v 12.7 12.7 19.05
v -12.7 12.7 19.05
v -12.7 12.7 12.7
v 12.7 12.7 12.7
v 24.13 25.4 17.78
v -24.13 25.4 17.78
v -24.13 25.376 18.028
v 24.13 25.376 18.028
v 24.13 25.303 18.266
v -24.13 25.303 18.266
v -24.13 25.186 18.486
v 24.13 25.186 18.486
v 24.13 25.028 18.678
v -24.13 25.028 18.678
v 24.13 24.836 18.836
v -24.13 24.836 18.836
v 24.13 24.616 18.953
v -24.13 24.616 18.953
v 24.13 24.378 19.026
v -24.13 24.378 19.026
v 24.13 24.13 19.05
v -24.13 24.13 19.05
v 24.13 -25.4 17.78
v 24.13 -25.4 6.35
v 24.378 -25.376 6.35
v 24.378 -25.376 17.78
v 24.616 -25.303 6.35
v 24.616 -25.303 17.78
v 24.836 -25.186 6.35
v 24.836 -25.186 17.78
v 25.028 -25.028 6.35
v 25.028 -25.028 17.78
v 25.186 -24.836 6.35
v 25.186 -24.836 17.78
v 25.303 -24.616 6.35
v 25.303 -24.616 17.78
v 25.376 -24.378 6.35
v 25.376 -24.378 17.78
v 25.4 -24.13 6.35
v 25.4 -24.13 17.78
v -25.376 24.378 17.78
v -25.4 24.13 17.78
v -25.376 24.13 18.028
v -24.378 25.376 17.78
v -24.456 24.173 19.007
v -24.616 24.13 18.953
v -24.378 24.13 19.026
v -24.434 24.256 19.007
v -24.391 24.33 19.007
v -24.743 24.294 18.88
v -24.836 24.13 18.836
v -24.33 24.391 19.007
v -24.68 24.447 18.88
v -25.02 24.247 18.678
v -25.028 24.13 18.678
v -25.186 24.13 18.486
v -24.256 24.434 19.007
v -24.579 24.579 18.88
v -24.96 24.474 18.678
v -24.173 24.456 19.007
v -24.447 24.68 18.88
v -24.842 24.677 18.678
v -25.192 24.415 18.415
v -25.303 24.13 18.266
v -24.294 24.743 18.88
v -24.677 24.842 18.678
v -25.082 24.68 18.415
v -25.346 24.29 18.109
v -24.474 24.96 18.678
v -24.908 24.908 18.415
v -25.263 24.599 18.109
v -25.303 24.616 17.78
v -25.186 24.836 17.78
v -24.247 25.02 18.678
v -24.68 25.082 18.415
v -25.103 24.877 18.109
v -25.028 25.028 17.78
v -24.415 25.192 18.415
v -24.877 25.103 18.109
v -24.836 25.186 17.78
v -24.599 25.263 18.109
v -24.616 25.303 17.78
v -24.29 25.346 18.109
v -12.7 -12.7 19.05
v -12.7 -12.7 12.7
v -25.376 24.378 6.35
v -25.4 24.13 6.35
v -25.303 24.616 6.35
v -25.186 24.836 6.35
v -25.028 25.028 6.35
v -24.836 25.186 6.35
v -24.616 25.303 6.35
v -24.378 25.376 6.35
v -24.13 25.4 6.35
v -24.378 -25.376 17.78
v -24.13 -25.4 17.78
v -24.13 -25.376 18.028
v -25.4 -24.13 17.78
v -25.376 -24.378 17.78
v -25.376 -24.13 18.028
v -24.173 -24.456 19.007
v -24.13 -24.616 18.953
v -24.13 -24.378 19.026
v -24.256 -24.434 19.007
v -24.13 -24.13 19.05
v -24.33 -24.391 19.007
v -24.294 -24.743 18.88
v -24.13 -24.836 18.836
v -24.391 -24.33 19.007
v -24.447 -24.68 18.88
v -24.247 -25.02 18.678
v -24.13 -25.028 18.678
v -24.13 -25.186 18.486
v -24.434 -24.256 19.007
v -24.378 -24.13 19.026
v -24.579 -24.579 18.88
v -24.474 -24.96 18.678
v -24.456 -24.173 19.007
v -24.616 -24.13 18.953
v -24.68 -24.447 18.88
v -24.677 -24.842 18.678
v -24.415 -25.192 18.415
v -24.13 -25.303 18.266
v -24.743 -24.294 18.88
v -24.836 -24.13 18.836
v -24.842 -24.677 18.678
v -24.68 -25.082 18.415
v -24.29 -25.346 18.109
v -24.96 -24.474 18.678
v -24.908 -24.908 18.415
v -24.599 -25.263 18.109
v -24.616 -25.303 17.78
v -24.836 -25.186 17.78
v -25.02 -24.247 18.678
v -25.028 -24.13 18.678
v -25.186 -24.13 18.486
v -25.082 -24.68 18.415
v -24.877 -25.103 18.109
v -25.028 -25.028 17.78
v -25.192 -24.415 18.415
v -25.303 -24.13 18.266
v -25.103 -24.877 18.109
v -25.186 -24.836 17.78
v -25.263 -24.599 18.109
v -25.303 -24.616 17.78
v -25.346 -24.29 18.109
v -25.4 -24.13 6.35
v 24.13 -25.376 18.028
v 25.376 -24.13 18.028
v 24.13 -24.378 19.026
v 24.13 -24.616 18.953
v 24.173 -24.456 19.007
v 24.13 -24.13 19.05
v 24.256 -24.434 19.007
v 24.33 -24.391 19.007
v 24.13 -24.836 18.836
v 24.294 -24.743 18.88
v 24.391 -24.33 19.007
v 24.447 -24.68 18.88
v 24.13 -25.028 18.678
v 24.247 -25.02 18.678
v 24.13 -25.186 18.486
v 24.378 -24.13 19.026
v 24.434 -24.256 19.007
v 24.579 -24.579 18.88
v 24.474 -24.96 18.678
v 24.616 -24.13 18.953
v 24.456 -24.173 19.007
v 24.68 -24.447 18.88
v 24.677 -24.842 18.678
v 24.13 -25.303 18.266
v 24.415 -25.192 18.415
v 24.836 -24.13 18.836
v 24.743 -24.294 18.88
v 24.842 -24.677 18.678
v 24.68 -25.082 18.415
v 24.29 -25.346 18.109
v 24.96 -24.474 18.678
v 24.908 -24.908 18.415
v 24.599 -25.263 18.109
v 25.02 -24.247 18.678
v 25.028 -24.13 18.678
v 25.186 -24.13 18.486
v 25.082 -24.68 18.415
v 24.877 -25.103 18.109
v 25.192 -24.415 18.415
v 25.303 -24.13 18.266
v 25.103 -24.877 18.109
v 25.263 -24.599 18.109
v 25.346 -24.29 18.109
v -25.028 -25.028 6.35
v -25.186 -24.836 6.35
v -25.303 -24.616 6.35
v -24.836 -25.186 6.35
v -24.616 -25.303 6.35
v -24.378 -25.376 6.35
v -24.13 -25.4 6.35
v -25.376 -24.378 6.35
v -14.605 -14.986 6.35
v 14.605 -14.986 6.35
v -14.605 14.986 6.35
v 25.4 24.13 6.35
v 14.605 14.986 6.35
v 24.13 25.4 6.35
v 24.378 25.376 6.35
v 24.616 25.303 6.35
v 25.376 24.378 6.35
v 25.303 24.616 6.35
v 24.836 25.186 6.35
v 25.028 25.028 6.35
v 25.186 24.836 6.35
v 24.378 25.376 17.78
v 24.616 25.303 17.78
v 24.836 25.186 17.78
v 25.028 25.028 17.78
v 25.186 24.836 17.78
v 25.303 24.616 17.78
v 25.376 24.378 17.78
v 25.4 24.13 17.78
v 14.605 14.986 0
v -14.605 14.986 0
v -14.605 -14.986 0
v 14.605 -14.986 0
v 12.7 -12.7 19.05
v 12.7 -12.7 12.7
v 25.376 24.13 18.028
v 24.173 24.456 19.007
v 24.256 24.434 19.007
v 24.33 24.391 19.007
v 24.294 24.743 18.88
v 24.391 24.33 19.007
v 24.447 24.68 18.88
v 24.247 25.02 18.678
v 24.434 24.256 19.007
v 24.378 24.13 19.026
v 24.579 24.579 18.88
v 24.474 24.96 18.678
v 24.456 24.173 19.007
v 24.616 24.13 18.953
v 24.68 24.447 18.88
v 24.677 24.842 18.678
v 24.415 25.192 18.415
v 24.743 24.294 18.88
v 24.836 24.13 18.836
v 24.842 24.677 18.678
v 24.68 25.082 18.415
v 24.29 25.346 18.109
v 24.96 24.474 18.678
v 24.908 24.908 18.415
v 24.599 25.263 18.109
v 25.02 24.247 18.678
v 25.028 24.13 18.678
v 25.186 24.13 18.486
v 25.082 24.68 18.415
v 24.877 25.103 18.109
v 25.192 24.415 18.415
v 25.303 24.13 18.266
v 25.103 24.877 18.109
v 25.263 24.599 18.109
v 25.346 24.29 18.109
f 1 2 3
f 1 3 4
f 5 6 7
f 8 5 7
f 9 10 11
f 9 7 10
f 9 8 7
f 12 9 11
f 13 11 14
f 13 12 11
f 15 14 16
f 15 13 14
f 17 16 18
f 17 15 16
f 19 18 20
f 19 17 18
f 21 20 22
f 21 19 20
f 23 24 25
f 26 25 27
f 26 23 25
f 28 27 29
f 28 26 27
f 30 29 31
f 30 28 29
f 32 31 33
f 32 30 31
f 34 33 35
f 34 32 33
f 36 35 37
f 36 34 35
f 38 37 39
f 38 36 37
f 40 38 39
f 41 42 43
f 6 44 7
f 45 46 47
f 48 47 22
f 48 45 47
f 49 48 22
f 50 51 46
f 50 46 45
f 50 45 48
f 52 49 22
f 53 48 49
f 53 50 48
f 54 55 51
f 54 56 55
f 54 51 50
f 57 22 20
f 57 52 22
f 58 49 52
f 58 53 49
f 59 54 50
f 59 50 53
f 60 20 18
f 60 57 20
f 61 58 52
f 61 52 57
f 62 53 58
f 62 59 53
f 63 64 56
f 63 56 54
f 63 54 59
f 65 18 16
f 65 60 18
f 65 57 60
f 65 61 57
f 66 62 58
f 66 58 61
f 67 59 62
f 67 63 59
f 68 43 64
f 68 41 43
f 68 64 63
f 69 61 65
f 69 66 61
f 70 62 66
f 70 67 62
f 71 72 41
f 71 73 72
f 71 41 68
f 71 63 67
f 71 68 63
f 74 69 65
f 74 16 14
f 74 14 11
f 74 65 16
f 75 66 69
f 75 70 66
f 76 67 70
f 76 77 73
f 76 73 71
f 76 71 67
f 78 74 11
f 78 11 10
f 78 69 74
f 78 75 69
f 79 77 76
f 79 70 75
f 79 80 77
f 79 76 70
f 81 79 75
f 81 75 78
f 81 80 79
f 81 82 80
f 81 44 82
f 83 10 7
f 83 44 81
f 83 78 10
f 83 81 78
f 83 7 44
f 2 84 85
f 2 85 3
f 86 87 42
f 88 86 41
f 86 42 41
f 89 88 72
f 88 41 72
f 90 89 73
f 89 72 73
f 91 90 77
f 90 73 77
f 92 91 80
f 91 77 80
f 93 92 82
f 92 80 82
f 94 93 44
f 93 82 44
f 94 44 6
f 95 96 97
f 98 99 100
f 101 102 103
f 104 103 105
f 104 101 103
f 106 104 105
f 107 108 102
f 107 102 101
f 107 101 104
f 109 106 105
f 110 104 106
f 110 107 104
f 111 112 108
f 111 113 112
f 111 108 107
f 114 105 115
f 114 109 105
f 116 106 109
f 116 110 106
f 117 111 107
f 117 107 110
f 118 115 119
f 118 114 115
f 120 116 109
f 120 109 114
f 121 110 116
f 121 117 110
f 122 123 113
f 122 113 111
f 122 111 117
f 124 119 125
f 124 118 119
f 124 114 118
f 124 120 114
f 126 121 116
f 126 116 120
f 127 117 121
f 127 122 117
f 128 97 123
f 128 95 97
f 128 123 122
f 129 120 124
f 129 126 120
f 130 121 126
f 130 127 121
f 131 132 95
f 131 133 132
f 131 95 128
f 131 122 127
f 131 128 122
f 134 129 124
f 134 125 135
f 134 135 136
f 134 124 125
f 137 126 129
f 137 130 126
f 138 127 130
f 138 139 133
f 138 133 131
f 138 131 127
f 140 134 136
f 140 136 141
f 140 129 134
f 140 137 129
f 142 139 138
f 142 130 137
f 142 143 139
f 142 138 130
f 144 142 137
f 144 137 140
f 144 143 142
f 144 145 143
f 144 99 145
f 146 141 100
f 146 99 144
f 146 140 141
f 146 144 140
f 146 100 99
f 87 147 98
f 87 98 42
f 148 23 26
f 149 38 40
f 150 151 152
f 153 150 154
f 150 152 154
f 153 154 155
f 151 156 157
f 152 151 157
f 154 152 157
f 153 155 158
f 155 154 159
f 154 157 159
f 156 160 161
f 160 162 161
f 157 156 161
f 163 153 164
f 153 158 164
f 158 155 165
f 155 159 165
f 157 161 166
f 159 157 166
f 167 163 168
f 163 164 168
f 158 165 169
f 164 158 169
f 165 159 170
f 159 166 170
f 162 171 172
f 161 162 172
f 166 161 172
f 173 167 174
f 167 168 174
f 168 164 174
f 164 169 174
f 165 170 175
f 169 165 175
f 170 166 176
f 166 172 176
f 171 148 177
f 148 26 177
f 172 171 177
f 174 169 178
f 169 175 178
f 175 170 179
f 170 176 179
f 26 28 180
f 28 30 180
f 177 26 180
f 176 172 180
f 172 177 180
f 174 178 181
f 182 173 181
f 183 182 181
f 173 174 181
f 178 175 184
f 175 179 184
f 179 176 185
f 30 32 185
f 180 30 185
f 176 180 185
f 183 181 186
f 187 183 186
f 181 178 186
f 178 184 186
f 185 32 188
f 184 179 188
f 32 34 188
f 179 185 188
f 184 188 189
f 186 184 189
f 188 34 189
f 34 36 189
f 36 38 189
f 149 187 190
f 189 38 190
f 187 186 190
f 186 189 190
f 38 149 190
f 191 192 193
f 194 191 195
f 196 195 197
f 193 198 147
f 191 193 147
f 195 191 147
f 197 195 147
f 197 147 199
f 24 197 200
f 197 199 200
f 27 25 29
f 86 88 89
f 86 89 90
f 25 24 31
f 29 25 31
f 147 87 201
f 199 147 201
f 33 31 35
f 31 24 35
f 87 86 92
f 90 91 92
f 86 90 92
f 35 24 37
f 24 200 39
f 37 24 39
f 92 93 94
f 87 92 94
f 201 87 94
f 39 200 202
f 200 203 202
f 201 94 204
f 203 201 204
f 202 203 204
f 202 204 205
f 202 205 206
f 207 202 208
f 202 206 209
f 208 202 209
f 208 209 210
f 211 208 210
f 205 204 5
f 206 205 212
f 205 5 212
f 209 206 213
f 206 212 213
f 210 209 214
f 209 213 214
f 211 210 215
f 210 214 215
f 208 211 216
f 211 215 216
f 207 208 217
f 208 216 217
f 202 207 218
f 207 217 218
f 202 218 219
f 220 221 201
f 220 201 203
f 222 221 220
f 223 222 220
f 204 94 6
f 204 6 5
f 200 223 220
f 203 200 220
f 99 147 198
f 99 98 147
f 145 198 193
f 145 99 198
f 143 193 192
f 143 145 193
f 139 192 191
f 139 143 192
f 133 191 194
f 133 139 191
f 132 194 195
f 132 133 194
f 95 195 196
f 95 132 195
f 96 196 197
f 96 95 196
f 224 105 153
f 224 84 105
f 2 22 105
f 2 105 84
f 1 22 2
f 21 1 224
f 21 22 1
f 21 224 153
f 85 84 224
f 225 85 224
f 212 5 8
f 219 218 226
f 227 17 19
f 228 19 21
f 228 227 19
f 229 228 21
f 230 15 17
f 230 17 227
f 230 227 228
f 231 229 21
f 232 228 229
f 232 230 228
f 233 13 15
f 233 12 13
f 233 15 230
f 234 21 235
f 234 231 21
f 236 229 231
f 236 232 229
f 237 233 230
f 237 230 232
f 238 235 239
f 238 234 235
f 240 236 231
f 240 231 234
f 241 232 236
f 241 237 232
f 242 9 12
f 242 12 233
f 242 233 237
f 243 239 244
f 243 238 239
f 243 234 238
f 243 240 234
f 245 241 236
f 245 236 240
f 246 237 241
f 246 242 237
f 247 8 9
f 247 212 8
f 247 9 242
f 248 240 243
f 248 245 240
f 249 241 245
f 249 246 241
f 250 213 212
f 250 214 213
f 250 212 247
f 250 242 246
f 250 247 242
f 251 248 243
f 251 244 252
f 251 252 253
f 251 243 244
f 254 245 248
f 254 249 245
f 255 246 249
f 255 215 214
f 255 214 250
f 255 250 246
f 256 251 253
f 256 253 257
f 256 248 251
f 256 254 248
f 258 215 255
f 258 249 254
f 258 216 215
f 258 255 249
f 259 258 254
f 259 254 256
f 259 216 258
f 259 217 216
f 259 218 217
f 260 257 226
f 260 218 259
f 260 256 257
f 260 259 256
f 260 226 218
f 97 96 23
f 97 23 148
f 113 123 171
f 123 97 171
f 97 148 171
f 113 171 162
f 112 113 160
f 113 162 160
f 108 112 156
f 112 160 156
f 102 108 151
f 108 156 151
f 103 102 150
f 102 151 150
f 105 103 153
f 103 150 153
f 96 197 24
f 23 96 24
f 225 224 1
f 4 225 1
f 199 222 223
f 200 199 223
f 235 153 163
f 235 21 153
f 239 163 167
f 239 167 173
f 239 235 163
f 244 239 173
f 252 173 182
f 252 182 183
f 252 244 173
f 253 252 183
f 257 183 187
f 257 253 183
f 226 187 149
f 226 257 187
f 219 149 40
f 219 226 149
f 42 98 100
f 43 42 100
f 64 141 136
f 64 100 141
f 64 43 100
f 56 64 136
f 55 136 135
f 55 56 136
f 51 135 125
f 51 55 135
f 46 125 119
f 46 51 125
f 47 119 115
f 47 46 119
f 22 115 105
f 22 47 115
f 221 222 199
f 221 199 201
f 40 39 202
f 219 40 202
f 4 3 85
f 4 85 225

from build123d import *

# Parameters (mm, degrees)
F0_W     = 29.21
F0_H     = 29.972
F1_DEPTH = 6.35
F2_W     = 50.8
F2_H     = 50.8
F3_DEPTH = 12.7
F4_W     = 25.4
F4_H     = 25.4
F5_DEPTH = 6.35
F6_R     = 1.27


with BuildPart() as f1:
    # F0 (on Top) → F1 (new body)
    with BuildSketch(Plane.XY):
        Rectangle(F0_W, F0_H)
    extrude(amount=F1_DEPTH)

    # F2 (on face) → F3 (join)
    with BuildSketch(Plane.XY.offset(6.35)):
        Rectangle(F2_W, F2_H)
    extrude(amount=F3_DEPTH)

    # F4 (on face) → F5 (cut)
    with BuildSketch(Plane.XY.offset(19.05)):
        Rectangle(F4_W, F4_H)
    extrude(amount=-F5_DEPTH, mode=Mode.SUBTRACT)

    # F6
    f6_edges = [f1.edges().sort_by_distance(p)[0] for p in [
        (-25.4, -25.4, 12.7),
        (25.4, -25.4, 12.7),
        (25.4, 25.4, 12.7),
        (-25.4, 25.4, 12.7),
        (0, -25.4, 19.05),
        (-25.4, 0, 19.05),
        (0, 25.4, 19.05),
        (25.4, 0, 19.05),
    ]]
    fillet(f6_edges, radius=F6_R)


solid = f1.part
